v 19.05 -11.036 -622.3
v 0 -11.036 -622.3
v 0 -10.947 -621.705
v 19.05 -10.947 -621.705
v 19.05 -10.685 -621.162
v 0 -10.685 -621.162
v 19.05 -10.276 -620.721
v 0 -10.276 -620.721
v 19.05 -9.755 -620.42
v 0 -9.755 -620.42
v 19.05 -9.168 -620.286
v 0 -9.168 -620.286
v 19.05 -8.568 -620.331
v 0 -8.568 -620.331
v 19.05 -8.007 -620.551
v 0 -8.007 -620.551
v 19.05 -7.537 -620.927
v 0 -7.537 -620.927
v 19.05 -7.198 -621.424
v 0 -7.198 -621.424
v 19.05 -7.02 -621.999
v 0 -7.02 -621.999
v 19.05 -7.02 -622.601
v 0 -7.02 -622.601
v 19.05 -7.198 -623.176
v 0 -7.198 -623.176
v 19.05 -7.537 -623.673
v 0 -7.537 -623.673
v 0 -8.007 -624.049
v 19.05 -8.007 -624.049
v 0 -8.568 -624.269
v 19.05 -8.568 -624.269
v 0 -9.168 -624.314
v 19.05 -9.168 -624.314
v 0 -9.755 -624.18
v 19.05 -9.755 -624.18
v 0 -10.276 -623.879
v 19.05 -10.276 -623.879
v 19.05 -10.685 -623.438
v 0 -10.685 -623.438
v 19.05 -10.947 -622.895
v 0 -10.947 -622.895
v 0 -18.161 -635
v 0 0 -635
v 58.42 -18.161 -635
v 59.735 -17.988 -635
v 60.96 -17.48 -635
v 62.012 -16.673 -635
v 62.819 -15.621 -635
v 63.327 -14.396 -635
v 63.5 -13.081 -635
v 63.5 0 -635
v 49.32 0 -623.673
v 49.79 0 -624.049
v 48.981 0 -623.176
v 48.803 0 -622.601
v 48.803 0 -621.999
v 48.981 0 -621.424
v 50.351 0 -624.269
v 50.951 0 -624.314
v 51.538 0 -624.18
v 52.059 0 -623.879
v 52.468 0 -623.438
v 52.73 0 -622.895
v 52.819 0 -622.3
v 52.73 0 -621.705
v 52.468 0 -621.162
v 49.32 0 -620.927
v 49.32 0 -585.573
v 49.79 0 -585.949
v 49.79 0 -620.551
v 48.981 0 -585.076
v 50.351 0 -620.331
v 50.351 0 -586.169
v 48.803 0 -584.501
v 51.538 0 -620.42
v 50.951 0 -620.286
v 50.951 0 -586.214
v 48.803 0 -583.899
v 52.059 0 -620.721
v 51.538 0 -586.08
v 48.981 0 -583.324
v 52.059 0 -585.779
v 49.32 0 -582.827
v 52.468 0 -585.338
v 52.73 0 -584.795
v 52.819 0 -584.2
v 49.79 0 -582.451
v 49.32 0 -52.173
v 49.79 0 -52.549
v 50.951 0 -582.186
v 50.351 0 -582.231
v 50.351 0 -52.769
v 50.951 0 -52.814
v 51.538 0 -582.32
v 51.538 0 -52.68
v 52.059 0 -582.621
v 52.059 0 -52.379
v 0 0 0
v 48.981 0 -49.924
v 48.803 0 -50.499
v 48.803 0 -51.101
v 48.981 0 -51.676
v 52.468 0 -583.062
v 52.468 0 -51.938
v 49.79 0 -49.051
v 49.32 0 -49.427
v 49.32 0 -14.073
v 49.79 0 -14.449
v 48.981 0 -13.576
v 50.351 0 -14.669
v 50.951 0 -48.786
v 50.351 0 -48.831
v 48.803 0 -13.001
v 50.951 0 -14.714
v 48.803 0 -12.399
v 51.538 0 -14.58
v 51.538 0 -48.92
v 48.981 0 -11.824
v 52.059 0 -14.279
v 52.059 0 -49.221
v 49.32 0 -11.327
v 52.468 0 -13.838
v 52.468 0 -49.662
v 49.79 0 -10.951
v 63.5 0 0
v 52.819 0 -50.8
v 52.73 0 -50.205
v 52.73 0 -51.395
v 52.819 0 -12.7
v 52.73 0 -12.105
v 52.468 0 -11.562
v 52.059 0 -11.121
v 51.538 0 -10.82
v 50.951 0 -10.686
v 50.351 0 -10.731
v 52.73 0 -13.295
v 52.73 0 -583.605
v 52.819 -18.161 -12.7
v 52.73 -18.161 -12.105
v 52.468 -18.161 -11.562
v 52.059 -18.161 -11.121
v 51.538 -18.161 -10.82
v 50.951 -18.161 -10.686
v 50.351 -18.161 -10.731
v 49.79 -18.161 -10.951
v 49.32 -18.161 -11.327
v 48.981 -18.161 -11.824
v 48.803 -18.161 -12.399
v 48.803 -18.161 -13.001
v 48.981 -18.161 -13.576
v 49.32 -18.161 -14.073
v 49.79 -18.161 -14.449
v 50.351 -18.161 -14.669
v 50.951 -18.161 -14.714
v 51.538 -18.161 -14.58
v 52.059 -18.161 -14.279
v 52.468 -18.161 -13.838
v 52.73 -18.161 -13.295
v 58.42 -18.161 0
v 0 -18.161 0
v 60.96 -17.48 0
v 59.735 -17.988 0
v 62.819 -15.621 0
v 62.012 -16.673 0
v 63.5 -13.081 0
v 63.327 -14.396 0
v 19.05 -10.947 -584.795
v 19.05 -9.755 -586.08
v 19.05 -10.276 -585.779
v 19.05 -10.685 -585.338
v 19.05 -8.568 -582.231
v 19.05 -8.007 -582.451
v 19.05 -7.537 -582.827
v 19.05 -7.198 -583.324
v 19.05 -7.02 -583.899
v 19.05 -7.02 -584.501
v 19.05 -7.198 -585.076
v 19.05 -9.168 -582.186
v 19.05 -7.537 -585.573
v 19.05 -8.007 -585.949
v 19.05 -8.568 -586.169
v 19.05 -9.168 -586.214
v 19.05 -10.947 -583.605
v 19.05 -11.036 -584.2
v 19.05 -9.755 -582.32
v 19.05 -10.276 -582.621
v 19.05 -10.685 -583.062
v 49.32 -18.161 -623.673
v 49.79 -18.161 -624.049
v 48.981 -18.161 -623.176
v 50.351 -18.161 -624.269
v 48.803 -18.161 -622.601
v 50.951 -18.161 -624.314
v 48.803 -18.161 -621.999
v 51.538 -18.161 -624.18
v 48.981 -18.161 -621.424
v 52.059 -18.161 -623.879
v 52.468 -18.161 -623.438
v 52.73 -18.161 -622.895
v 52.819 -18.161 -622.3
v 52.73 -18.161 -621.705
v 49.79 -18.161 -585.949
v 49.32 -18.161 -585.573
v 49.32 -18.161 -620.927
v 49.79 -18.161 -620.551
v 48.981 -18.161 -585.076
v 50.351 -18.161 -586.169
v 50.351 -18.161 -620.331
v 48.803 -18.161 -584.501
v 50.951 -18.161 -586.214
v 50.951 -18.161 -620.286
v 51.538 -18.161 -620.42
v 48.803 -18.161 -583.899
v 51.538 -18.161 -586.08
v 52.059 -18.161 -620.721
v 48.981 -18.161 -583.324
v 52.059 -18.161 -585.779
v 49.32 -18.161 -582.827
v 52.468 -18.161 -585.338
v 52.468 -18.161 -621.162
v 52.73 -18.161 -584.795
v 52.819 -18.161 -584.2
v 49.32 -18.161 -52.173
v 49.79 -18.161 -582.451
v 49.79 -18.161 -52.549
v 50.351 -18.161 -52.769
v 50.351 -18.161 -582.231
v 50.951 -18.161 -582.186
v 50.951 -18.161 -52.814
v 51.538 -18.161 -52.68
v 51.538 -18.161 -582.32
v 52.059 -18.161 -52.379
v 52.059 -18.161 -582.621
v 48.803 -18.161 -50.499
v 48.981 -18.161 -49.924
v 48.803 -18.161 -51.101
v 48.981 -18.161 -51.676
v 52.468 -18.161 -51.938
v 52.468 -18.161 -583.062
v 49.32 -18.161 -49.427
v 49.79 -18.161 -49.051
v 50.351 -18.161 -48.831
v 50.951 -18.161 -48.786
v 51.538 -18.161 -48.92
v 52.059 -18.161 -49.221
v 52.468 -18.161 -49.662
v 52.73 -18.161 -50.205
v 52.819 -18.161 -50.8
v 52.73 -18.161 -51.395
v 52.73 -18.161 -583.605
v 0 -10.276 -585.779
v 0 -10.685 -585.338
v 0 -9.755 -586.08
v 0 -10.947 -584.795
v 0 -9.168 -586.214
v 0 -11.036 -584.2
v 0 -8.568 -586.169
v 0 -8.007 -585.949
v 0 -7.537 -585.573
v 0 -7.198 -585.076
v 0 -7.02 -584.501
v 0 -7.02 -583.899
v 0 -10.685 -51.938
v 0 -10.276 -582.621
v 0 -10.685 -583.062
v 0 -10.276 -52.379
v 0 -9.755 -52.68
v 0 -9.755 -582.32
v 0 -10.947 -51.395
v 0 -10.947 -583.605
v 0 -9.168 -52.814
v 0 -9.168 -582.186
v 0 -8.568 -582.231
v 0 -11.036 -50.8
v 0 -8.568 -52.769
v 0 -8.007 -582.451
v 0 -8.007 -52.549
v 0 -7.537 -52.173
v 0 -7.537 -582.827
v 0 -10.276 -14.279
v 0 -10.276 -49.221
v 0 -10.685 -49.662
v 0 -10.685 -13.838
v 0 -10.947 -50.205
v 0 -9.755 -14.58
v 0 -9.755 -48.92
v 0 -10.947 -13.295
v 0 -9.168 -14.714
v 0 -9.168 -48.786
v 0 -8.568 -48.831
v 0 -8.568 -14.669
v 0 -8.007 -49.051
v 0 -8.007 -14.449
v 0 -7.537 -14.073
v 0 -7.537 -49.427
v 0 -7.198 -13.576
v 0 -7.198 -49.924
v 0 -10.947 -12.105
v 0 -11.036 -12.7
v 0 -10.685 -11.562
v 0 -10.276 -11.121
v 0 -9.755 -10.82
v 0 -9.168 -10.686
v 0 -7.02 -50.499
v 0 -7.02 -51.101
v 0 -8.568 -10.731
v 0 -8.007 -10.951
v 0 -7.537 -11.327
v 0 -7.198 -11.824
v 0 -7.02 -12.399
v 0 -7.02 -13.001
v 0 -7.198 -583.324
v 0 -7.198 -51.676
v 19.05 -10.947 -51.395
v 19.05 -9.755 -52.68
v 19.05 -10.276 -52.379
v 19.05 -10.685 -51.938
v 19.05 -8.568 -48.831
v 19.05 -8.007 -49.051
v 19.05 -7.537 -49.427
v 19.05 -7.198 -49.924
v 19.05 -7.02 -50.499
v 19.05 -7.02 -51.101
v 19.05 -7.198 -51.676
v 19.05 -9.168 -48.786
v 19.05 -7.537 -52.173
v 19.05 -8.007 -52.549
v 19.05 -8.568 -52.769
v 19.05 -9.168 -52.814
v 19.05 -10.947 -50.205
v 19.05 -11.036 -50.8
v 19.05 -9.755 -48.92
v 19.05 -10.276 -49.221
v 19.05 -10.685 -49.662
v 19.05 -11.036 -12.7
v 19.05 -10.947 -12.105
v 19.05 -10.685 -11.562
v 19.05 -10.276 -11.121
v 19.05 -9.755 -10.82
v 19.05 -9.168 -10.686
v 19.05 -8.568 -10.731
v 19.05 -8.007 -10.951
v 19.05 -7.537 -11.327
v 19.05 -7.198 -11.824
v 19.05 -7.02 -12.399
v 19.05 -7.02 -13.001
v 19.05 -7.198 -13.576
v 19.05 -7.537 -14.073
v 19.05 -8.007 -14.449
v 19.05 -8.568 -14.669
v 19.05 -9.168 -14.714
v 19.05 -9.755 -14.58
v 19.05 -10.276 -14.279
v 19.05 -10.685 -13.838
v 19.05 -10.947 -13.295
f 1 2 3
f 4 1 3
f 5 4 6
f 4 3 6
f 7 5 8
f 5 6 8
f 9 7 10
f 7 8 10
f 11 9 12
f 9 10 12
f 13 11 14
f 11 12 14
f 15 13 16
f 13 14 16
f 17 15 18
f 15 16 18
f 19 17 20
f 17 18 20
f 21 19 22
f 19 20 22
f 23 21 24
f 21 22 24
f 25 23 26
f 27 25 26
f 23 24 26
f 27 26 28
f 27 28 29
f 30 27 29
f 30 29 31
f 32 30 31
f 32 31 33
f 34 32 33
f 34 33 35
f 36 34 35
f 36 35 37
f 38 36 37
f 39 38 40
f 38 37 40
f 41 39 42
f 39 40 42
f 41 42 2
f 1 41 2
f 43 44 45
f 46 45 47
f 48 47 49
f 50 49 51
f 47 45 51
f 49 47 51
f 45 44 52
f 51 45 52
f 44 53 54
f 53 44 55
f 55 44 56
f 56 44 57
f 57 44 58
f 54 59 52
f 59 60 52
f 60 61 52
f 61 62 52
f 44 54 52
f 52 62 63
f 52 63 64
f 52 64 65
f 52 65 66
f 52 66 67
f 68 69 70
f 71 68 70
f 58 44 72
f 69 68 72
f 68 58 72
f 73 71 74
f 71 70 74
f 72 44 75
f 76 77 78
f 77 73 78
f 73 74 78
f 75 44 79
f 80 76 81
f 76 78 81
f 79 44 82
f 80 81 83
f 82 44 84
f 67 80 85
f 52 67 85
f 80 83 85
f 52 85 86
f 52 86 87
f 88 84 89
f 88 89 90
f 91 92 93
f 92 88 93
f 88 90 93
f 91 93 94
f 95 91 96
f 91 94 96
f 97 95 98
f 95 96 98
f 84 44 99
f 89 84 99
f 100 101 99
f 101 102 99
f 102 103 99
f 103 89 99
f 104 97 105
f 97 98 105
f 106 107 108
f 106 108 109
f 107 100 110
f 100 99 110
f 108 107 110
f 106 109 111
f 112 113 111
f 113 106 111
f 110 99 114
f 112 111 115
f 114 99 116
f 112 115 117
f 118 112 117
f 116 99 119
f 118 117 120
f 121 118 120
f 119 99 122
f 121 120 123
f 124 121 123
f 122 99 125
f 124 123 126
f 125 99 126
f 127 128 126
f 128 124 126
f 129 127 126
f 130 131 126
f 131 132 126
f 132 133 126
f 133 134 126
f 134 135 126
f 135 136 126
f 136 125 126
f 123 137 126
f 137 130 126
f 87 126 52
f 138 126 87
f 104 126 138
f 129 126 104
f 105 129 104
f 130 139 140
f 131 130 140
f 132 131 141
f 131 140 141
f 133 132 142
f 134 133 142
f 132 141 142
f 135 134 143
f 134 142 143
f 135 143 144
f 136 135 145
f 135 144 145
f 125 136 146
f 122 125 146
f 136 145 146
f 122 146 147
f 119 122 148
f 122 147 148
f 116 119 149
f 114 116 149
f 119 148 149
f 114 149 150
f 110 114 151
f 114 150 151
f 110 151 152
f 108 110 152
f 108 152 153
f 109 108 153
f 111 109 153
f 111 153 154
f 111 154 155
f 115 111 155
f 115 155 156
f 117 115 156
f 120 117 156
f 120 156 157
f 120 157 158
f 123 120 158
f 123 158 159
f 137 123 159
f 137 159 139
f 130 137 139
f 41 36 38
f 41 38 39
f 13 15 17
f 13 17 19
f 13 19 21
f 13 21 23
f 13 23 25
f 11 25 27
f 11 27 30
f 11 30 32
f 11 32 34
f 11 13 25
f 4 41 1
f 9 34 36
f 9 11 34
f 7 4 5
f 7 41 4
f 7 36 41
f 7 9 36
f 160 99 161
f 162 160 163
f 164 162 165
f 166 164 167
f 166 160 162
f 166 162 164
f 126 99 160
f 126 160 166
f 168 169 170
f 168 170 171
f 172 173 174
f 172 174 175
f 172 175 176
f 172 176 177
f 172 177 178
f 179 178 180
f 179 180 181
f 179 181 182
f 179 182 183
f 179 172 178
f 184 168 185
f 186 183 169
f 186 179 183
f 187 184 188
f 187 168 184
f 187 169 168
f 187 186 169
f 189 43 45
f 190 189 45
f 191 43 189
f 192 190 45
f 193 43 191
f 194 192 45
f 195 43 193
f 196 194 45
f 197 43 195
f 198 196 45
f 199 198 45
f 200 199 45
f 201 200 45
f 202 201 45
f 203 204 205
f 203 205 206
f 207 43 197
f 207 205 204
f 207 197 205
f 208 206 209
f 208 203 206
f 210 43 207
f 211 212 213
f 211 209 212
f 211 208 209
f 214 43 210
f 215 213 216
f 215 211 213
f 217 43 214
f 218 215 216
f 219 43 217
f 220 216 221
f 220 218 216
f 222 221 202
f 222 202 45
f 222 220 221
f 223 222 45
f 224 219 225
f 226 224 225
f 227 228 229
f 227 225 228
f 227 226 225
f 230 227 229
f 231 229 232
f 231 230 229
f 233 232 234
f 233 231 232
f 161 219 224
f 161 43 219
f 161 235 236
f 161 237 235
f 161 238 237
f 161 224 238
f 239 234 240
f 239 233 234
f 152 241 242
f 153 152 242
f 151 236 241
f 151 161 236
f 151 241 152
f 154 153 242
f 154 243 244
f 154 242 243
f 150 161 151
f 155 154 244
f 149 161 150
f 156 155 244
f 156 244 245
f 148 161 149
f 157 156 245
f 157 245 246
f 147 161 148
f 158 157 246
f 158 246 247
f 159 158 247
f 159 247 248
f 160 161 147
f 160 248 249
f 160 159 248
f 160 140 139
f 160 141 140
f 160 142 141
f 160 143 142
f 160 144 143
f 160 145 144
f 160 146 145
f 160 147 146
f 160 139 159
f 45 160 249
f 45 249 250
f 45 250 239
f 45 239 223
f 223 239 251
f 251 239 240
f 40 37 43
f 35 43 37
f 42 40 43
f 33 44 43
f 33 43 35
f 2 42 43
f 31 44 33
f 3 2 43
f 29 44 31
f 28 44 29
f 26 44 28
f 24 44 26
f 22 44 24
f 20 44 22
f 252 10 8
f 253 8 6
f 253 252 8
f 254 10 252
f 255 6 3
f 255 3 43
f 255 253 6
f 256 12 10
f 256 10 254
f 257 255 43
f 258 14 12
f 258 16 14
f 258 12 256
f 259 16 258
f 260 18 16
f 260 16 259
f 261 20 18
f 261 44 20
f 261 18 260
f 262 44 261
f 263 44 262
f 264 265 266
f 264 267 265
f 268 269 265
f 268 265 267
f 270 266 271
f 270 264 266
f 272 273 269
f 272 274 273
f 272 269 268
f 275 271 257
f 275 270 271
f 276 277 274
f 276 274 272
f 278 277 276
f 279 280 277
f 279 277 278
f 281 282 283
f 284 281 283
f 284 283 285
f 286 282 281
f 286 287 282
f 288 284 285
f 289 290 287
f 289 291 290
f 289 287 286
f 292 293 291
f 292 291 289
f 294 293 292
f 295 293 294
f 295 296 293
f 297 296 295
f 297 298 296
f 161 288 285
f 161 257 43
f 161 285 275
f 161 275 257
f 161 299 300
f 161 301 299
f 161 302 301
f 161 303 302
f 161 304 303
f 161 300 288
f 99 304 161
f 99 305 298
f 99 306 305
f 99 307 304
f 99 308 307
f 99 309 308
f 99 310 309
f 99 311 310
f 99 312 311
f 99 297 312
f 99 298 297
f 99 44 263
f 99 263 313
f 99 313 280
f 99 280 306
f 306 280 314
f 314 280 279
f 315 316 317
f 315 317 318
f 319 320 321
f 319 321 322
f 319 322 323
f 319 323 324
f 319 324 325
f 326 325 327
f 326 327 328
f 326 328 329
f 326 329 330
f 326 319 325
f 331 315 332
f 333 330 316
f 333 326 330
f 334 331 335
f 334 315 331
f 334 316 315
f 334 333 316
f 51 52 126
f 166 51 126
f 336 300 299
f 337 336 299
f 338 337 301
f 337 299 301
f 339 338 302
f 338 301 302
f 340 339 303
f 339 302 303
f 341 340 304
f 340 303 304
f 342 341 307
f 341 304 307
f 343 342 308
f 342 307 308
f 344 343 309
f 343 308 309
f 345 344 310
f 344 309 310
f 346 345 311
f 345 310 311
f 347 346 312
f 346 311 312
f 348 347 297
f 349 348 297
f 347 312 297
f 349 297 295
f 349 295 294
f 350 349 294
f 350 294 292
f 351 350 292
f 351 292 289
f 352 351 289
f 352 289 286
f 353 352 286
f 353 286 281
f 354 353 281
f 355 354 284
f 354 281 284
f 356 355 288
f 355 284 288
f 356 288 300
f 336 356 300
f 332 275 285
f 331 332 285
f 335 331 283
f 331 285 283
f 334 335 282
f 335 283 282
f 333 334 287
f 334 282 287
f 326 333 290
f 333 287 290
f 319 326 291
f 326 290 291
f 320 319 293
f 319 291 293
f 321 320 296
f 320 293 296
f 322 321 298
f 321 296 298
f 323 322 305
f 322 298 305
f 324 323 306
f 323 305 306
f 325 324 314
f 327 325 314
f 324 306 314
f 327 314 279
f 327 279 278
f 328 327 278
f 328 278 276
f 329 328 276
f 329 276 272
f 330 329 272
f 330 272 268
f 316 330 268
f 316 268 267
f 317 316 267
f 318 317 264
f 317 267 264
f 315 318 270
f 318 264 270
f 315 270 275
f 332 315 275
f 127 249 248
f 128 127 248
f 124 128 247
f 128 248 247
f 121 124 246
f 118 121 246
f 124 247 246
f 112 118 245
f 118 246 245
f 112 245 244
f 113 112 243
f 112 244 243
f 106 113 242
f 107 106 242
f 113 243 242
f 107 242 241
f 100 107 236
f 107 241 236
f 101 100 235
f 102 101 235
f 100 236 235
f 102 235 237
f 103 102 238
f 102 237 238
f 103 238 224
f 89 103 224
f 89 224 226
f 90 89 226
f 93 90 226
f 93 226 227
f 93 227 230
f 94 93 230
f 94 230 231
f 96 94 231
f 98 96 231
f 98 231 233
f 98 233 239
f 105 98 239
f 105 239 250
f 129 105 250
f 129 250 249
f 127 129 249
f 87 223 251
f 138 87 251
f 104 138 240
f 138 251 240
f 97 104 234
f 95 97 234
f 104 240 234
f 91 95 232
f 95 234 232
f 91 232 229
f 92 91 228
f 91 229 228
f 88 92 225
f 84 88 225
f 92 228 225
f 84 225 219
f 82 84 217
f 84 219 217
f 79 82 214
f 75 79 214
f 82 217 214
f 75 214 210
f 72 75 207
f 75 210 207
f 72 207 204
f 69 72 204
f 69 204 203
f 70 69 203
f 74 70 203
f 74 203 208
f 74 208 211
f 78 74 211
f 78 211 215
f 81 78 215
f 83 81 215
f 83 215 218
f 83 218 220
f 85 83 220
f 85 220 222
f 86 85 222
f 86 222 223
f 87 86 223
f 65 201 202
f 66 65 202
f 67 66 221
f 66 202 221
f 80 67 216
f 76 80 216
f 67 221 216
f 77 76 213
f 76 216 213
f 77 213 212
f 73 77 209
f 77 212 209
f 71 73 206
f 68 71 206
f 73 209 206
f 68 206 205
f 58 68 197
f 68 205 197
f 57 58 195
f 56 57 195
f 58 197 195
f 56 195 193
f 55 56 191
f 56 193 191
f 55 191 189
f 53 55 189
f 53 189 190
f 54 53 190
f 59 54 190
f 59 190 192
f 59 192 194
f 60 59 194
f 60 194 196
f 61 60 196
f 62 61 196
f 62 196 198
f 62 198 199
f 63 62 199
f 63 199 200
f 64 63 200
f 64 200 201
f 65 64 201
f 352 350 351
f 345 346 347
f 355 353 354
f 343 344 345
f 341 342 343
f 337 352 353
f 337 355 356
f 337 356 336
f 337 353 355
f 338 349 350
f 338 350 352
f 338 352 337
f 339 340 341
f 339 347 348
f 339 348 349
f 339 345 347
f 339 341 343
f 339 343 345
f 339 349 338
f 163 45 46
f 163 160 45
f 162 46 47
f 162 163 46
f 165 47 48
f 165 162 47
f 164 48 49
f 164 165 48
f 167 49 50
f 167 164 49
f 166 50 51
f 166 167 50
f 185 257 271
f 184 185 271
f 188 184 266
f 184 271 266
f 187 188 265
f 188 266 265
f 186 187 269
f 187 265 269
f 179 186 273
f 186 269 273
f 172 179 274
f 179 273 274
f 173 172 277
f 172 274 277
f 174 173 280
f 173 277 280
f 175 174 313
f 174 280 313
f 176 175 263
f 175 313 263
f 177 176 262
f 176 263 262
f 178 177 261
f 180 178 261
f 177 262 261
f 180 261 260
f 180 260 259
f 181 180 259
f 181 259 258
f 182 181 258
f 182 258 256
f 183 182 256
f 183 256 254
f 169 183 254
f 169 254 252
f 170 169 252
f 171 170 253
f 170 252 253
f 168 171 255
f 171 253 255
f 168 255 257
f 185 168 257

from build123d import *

# Parameters (mm, degrees)
F0_W     = 63.5
F0_H     = 635
F1_DEPTH = 18.161
F2_R     = 2.0193
F3_DEPTH = 18.162
F4_R     = 2.0193
F5_DEPTH = 19.05
F6_R     = 5.08


with BuildPart() as f1:
    # F0 (on Front) → F1 (new body)
    with BuildSketch(Plane.XZ):
        with Locations((31.75, -317.5)):
            Rectangle(F0_W, F0_H)
    extrude(amount=F1_DEPTH)

    # F2 (on face) → F3 (cut, through all)
    with BuildSketch(Plane.XZ.offset(18.161)):
        with Locations((50.8, -12.7)):
            Circle(F2_R)
        with Locations((50.8, -50.8)):
            Circle(F2_R)
        with Locations((50.8, -622.3)):
            Circle(F2_R)
        with Locations((50.8, -584.2)):
            Circle(F2_R)
    extrude(amount=-F3_DEPTH, mode=Mode.SUBTRACT)

    # F4 (on face) → F5 (cut)
    with BuildSketch(Plane(origin=(0, 0, 0), x_dir=(0, -1, 0), z_dir=(-1, 0, 0))):
        with Locations((9.017, -12.7)):
            Circle(F4_R)
        with Locations((9.017, -50.8)):
            Circle(F4_R)
        with Locations((9.017, -622.3)):
            Circle(F4_R)
        with Locations((9.017, -584.2)):
            Circle(F4_R)
    extrude(amount=-F5_DEPTH, mode=Mode.SUBTRACT)

    # F6
    f6_edges = [f1.edges().sort_by_distance(p)[0] for p in [
        (63.5, -18.161, -317.5),
    ]]
    fillet(f6_edges, radius=F6_R)


solid = f1.part
